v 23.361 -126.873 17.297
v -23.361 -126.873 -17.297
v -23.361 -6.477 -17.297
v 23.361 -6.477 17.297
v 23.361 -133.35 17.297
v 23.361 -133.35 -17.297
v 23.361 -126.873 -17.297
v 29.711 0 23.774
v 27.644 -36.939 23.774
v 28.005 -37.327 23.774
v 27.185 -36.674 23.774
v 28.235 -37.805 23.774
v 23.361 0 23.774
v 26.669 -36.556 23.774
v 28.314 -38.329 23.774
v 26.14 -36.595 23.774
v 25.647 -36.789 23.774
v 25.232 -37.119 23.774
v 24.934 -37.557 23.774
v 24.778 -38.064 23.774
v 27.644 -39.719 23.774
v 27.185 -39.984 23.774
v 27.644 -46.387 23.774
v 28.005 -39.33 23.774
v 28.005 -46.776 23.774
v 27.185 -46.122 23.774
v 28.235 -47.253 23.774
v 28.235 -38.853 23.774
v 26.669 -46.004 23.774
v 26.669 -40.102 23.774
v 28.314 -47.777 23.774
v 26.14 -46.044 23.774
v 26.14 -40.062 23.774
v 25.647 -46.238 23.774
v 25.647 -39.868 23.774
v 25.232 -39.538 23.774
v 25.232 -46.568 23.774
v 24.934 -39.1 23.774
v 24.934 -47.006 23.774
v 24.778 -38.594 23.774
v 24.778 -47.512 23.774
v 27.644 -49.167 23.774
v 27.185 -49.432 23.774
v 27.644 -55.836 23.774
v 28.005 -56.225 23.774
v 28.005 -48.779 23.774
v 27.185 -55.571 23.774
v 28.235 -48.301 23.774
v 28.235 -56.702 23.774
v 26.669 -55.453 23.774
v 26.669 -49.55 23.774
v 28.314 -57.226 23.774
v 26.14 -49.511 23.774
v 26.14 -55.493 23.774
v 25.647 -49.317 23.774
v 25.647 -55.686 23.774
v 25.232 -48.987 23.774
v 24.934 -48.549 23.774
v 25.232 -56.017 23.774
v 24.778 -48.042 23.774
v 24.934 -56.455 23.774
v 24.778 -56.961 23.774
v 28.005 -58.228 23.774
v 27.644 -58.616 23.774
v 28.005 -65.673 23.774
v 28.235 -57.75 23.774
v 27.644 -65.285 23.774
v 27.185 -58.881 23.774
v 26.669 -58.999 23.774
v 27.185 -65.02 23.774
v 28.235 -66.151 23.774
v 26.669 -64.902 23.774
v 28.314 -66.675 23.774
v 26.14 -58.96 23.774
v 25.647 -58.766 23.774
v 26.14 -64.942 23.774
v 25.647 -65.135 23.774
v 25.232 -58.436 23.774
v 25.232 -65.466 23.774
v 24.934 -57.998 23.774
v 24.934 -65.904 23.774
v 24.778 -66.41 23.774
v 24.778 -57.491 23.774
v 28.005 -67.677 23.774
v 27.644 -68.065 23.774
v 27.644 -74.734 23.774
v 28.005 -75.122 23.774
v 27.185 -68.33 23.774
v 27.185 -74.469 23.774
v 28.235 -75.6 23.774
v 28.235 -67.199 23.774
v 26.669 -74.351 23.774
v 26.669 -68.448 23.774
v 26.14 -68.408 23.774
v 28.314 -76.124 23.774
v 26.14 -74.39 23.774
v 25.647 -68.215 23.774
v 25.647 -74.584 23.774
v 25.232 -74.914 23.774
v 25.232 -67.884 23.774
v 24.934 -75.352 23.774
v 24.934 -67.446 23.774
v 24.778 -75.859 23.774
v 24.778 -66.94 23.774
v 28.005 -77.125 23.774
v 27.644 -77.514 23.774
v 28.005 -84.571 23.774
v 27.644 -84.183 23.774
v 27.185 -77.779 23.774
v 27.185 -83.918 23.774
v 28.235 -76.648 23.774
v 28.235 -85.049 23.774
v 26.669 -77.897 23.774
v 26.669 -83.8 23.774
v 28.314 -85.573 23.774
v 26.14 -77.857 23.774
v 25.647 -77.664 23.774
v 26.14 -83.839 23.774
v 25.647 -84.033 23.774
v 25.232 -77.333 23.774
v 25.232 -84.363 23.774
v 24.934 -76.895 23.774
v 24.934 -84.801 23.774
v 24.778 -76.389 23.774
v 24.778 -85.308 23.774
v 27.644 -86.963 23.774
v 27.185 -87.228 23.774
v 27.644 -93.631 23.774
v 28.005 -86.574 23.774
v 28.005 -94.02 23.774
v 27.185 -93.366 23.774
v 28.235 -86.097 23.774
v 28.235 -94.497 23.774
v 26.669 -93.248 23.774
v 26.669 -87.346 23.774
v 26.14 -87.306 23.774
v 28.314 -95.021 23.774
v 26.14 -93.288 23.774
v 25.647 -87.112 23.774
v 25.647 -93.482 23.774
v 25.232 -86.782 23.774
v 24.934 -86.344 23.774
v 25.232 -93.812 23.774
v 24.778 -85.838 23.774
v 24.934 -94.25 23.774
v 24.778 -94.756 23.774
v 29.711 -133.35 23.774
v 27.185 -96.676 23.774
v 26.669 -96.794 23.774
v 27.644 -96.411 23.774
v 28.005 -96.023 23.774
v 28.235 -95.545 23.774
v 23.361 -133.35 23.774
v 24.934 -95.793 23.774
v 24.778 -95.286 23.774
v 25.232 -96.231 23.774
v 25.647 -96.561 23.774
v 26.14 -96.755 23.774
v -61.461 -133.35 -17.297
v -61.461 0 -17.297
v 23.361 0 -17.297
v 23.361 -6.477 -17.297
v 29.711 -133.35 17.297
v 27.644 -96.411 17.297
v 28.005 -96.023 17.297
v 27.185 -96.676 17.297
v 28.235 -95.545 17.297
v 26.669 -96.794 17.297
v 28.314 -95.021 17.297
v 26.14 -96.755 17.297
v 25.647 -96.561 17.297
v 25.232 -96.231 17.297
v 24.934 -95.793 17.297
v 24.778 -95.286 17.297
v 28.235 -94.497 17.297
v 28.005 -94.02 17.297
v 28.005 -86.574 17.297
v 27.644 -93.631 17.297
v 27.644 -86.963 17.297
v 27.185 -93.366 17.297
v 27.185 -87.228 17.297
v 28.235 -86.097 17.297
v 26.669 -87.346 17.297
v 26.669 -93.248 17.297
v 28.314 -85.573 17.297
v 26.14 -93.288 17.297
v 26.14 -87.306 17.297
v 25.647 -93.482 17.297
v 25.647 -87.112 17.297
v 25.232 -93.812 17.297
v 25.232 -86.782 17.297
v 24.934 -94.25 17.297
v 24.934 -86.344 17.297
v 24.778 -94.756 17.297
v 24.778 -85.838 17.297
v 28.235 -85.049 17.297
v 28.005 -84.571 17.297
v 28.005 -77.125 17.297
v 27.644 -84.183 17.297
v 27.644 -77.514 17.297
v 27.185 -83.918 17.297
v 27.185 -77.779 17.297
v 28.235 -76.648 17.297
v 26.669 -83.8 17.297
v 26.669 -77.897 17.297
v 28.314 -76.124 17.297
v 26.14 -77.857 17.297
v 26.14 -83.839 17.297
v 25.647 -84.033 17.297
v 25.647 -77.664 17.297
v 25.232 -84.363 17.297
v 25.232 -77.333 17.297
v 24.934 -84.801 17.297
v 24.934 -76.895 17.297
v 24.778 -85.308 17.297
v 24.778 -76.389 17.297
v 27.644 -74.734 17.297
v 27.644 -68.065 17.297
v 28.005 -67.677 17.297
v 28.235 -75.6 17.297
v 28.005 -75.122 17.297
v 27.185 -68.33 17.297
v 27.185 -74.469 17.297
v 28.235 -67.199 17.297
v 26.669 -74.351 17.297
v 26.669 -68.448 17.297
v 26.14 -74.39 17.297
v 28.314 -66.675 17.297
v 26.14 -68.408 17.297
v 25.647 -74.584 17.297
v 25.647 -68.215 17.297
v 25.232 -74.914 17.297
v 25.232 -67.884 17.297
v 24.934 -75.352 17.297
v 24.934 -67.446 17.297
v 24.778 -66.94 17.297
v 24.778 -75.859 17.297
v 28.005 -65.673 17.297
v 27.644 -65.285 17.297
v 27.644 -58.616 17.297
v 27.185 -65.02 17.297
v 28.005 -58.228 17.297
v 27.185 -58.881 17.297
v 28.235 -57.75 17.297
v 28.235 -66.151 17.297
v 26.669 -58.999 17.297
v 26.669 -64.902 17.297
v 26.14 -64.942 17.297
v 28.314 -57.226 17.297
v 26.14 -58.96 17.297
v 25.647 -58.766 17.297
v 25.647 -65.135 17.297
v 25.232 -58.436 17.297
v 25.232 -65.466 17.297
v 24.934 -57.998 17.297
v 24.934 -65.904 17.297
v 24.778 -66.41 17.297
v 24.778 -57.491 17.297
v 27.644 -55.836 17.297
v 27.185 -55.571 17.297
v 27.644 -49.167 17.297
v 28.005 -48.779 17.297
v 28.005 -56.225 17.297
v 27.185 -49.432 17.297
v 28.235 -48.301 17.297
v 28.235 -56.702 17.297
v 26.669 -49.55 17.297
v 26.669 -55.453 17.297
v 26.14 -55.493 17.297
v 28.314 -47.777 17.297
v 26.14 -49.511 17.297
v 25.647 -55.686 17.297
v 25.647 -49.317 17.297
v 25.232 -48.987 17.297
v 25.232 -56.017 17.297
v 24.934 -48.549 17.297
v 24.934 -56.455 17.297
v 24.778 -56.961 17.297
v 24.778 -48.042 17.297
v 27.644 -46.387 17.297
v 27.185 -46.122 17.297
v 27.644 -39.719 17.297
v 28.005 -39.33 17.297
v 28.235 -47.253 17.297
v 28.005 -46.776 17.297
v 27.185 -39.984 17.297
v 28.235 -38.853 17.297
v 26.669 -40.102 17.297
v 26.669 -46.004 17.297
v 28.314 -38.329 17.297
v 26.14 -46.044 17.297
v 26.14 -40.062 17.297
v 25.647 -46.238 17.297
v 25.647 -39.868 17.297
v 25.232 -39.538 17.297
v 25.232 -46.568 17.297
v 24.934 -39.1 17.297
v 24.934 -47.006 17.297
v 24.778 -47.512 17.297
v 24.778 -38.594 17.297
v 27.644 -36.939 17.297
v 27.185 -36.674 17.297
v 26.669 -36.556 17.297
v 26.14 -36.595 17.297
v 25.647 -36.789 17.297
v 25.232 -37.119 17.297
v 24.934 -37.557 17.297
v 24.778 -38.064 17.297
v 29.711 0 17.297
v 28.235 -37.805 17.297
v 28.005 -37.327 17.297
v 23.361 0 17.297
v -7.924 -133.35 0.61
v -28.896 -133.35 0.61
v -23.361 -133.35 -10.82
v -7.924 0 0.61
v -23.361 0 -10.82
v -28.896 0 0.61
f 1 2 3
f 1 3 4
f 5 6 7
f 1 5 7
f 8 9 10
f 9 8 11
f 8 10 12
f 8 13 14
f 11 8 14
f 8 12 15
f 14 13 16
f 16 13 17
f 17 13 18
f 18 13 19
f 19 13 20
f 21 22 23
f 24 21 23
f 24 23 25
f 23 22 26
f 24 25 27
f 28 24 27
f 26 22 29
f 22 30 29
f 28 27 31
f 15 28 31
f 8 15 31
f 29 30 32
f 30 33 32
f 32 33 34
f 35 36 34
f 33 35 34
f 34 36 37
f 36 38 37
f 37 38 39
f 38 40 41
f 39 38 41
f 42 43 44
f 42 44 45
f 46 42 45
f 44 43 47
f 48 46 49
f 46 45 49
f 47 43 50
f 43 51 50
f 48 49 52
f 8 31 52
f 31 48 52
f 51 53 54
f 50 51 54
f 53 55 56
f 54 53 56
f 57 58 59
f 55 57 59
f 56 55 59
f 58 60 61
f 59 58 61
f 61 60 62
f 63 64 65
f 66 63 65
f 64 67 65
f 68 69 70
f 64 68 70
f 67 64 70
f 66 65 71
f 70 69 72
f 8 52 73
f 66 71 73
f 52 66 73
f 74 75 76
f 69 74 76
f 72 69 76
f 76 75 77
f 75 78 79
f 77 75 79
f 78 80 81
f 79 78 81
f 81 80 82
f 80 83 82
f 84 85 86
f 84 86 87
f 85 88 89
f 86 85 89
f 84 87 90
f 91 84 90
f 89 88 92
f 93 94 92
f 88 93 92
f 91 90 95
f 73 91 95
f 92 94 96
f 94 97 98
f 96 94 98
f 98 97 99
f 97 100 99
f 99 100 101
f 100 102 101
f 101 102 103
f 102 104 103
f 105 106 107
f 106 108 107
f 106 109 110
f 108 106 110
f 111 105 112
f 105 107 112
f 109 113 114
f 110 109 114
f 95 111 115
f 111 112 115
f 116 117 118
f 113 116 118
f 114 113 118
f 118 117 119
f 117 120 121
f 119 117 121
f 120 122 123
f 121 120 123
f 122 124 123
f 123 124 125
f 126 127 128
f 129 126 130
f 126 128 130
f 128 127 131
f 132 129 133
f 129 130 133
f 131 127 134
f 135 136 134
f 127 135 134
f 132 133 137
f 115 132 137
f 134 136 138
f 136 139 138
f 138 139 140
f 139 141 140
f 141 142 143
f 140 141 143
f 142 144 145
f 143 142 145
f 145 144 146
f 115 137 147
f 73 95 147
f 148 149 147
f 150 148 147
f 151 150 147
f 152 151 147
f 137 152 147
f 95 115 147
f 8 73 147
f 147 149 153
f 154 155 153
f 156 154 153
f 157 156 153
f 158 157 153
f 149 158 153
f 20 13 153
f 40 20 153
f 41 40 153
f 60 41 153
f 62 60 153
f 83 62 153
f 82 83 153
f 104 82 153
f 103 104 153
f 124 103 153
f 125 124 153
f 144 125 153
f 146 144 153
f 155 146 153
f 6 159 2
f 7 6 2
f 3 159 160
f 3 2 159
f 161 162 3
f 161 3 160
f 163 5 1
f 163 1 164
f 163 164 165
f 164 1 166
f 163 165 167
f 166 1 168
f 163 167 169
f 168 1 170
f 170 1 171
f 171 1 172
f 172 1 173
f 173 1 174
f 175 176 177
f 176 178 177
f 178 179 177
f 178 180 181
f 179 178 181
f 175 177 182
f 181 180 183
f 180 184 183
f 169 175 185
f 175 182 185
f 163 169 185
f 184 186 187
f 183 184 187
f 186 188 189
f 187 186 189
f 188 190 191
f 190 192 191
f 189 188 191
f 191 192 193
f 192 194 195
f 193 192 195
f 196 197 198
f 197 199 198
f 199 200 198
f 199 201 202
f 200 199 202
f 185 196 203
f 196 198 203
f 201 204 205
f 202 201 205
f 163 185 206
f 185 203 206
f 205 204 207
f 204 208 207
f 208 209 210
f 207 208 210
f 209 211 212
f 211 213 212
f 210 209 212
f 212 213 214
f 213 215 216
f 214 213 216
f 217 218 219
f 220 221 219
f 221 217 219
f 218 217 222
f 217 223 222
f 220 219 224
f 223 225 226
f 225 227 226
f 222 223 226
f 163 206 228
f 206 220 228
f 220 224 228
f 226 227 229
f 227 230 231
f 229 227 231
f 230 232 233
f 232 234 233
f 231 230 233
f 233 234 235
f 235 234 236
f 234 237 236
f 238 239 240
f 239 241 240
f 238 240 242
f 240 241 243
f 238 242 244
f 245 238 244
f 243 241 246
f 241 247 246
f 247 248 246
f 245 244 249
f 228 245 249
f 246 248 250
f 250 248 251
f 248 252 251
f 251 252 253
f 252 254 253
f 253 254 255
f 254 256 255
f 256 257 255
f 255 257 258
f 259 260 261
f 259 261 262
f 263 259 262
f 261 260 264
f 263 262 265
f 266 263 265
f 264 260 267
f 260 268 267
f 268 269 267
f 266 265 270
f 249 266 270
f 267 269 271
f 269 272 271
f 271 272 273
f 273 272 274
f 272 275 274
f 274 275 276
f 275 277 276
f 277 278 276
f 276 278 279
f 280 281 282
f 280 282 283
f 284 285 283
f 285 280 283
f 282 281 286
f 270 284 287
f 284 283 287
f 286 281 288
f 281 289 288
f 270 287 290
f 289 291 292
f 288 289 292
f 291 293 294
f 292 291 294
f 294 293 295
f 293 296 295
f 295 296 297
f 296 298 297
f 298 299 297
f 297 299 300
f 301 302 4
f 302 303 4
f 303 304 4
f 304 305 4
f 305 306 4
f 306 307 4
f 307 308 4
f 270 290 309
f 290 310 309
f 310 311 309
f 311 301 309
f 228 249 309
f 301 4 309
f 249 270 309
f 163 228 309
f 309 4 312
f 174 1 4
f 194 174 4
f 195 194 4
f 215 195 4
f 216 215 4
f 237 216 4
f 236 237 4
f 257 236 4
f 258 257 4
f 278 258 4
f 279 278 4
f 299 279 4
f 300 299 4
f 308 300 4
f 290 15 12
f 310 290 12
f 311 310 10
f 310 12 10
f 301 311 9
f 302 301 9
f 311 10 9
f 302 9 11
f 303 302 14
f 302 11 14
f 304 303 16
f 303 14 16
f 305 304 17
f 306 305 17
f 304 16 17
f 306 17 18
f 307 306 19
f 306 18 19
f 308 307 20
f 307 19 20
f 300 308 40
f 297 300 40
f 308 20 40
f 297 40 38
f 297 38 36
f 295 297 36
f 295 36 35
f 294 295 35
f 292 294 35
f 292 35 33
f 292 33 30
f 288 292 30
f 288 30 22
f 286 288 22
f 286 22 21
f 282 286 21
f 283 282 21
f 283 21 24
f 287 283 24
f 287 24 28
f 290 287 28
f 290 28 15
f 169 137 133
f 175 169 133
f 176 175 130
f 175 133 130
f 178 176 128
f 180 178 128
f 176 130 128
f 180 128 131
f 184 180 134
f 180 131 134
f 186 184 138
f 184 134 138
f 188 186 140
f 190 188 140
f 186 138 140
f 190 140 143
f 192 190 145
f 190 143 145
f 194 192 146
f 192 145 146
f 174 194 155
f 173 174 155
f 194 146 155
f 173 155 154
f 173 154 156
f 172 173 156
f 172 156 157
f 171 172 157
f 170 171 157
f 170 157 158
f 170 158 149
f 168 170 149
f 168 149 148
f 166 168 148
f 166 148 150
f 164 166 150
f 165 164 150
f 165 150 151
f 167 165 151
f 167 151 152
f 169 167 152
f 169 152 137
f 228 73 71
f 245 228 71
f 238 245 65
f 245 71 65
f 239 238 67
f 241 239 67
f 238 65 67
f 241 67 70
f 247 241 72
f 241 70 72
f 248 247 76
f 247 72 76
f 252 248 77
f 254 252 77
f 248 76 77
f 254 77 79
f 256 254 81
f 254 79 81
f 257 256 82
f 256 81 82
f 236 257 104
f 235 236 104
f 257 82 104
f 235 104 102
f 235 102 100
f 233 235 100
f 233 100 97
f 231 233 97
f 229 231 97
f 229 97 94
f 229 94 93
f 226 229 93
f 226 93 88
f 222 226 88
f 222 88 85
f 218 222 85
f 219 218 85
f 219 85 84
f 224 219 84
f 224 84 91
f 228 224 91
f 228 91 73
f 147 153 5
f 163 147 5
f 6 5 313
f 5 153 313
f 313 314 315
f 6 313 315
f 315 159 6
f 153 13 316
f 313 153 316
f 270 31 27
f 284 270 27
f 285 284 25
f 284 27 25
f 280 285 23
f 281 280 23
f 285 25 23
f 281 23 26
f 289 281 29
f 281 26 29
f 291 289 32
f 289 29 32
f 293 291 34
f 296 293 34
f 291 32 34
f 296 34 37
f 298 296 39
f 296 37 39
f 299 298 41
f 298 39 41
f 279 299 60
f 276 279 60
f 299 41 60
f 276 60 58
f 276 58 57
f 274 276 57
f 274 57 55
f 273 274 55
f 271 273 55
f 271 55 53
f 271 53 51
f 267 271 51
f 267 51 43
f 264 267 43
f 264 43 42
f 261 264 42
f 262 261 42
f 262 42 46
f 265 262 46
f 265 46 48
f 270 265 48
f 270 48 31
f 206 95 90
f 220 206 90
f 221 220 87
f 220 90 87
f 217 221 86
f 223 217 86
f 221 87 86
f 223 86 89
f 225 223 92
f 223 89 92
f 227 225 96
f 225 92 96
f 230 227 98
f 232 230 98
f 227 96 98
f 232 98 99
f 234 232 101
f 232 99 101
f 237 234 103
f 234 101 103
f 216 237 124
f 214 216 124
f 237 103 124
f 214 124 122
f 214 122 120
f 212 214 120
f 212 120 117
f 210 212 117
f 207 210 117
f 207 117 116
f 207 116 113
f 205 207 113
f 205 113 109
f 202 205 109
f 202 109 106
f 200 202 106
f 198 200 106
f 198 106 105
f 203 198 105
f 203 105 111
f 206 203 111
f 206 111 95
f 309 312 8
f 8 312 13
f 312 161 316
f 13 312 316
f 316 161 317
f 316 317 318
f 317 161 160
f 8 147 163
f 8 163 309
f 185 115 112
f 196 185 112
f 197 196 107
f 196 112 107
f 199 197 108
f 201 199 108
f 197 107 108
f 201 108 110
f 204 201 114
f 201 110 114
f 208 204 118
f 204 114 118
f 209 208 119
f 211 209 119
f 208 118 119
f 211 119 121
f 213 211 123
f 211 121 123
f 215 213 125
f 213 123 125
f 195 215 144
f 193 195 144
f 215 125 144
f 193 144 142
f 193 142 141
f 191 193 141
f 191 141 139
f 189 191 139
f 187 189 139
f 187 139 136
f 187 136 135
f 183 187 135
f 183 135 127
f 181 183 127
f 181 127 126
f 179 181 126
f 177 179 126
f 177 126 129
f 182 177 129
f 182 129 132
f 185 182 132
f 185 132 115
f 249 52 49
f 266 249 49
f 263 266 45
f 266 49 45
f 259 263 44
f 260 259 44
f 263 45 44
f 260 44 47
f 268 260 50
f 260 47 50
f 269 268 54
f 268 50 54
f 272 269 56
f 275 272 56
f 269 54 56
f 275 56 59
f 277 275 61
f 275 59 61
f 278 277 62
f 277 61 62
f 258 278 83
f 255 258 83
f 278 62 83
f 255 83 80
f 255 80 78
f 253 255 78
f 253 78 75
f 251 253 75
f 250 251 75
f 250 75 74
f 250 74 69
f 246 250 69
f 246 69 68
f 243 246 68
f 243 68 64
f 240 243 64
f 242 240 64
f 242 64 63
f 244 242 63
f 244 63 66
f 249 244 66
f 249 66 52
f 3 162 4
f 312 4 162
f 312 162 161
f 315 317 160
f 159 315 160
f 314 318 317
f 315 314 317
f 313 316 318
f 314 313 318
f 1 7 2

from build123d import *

# Parameters (mm, degrees)
F1_DEPTH = 133.35
F2_W     = 6.477
F2_H     = 34.5941142
F5_DEPTH = 6.35
F6_R     = 1.778
F7_DEPTH = 25.4


with BuildPart() as f1:
    # F0 (on Front) → F1 (new body)
    with BuildSketch(Plane.XZ):
        Polygon((-23.3606961086, -17.2970571), (23.3606961086, 17.2970571), (23.3606961086, 23.7740571), (-7.9238067593, 0.6099429), (-23.3606961086, 0.6099429), (-28.8964977668, 0.6099429), (-23.3606961086, -10.8200571), (-61.4606961086, -17.2970571), align=None)
    extrude(amount=F1_DEPTH)

    # F2 (on face) → F3 (join, up to the next surface of F1)
    with BuildSketch(Plane.YZ.offset(23.3606961086)):
        with Locations((-130.1115, 0)):
            Rectangle(F2_W, F2_H)
        with Locations((-3.2385, 0)):
            Rectangle(F2_W, F2_H)
    extrude(until=Until.NEXT, dir=(-1, 0, 0))

    # F4 (on face) → F5 (join)
    with BuildSketch(Plane.YZ.offset(23.3606961086)):
        Polygon((0, 23.7740571), (-133.35, 23.7740571), (-133.35, 17.2970571), (-126.873, 17.2970571), (-6.477, 17.2970571), (0, 17.2970571), align=None)
    extrude(amount=F5_DEPTH)

    # F6 (on face) → F7 (cut)
    with BuildSketch(Plane.XY.offset(23.7740571)):
        with Locations((26.5356961086, -38.3286)):
            Circle(F6_R)
        with Locations((26.5356961086, -47.7774)):
            Circle(F6_R)
        with Locations((26.5356961086, -57.2262)):
            Circle(F6_R)
        with Locations((26.5356961086, -66.675)):
            Circle(F6_R)
        with Locations((26.5356961086, -76.1238)):
            Circle(F6_R)
        with Locations((26.5356961086, -85.5726)):
            Circle(F6_R)
        with Locations((26.5356961086, -95.0214)):
            Circle(F6_R)
    extrude(amount=-F7_DEPTH, mode=Mode.SUBTRACT)


solid = f1.part
